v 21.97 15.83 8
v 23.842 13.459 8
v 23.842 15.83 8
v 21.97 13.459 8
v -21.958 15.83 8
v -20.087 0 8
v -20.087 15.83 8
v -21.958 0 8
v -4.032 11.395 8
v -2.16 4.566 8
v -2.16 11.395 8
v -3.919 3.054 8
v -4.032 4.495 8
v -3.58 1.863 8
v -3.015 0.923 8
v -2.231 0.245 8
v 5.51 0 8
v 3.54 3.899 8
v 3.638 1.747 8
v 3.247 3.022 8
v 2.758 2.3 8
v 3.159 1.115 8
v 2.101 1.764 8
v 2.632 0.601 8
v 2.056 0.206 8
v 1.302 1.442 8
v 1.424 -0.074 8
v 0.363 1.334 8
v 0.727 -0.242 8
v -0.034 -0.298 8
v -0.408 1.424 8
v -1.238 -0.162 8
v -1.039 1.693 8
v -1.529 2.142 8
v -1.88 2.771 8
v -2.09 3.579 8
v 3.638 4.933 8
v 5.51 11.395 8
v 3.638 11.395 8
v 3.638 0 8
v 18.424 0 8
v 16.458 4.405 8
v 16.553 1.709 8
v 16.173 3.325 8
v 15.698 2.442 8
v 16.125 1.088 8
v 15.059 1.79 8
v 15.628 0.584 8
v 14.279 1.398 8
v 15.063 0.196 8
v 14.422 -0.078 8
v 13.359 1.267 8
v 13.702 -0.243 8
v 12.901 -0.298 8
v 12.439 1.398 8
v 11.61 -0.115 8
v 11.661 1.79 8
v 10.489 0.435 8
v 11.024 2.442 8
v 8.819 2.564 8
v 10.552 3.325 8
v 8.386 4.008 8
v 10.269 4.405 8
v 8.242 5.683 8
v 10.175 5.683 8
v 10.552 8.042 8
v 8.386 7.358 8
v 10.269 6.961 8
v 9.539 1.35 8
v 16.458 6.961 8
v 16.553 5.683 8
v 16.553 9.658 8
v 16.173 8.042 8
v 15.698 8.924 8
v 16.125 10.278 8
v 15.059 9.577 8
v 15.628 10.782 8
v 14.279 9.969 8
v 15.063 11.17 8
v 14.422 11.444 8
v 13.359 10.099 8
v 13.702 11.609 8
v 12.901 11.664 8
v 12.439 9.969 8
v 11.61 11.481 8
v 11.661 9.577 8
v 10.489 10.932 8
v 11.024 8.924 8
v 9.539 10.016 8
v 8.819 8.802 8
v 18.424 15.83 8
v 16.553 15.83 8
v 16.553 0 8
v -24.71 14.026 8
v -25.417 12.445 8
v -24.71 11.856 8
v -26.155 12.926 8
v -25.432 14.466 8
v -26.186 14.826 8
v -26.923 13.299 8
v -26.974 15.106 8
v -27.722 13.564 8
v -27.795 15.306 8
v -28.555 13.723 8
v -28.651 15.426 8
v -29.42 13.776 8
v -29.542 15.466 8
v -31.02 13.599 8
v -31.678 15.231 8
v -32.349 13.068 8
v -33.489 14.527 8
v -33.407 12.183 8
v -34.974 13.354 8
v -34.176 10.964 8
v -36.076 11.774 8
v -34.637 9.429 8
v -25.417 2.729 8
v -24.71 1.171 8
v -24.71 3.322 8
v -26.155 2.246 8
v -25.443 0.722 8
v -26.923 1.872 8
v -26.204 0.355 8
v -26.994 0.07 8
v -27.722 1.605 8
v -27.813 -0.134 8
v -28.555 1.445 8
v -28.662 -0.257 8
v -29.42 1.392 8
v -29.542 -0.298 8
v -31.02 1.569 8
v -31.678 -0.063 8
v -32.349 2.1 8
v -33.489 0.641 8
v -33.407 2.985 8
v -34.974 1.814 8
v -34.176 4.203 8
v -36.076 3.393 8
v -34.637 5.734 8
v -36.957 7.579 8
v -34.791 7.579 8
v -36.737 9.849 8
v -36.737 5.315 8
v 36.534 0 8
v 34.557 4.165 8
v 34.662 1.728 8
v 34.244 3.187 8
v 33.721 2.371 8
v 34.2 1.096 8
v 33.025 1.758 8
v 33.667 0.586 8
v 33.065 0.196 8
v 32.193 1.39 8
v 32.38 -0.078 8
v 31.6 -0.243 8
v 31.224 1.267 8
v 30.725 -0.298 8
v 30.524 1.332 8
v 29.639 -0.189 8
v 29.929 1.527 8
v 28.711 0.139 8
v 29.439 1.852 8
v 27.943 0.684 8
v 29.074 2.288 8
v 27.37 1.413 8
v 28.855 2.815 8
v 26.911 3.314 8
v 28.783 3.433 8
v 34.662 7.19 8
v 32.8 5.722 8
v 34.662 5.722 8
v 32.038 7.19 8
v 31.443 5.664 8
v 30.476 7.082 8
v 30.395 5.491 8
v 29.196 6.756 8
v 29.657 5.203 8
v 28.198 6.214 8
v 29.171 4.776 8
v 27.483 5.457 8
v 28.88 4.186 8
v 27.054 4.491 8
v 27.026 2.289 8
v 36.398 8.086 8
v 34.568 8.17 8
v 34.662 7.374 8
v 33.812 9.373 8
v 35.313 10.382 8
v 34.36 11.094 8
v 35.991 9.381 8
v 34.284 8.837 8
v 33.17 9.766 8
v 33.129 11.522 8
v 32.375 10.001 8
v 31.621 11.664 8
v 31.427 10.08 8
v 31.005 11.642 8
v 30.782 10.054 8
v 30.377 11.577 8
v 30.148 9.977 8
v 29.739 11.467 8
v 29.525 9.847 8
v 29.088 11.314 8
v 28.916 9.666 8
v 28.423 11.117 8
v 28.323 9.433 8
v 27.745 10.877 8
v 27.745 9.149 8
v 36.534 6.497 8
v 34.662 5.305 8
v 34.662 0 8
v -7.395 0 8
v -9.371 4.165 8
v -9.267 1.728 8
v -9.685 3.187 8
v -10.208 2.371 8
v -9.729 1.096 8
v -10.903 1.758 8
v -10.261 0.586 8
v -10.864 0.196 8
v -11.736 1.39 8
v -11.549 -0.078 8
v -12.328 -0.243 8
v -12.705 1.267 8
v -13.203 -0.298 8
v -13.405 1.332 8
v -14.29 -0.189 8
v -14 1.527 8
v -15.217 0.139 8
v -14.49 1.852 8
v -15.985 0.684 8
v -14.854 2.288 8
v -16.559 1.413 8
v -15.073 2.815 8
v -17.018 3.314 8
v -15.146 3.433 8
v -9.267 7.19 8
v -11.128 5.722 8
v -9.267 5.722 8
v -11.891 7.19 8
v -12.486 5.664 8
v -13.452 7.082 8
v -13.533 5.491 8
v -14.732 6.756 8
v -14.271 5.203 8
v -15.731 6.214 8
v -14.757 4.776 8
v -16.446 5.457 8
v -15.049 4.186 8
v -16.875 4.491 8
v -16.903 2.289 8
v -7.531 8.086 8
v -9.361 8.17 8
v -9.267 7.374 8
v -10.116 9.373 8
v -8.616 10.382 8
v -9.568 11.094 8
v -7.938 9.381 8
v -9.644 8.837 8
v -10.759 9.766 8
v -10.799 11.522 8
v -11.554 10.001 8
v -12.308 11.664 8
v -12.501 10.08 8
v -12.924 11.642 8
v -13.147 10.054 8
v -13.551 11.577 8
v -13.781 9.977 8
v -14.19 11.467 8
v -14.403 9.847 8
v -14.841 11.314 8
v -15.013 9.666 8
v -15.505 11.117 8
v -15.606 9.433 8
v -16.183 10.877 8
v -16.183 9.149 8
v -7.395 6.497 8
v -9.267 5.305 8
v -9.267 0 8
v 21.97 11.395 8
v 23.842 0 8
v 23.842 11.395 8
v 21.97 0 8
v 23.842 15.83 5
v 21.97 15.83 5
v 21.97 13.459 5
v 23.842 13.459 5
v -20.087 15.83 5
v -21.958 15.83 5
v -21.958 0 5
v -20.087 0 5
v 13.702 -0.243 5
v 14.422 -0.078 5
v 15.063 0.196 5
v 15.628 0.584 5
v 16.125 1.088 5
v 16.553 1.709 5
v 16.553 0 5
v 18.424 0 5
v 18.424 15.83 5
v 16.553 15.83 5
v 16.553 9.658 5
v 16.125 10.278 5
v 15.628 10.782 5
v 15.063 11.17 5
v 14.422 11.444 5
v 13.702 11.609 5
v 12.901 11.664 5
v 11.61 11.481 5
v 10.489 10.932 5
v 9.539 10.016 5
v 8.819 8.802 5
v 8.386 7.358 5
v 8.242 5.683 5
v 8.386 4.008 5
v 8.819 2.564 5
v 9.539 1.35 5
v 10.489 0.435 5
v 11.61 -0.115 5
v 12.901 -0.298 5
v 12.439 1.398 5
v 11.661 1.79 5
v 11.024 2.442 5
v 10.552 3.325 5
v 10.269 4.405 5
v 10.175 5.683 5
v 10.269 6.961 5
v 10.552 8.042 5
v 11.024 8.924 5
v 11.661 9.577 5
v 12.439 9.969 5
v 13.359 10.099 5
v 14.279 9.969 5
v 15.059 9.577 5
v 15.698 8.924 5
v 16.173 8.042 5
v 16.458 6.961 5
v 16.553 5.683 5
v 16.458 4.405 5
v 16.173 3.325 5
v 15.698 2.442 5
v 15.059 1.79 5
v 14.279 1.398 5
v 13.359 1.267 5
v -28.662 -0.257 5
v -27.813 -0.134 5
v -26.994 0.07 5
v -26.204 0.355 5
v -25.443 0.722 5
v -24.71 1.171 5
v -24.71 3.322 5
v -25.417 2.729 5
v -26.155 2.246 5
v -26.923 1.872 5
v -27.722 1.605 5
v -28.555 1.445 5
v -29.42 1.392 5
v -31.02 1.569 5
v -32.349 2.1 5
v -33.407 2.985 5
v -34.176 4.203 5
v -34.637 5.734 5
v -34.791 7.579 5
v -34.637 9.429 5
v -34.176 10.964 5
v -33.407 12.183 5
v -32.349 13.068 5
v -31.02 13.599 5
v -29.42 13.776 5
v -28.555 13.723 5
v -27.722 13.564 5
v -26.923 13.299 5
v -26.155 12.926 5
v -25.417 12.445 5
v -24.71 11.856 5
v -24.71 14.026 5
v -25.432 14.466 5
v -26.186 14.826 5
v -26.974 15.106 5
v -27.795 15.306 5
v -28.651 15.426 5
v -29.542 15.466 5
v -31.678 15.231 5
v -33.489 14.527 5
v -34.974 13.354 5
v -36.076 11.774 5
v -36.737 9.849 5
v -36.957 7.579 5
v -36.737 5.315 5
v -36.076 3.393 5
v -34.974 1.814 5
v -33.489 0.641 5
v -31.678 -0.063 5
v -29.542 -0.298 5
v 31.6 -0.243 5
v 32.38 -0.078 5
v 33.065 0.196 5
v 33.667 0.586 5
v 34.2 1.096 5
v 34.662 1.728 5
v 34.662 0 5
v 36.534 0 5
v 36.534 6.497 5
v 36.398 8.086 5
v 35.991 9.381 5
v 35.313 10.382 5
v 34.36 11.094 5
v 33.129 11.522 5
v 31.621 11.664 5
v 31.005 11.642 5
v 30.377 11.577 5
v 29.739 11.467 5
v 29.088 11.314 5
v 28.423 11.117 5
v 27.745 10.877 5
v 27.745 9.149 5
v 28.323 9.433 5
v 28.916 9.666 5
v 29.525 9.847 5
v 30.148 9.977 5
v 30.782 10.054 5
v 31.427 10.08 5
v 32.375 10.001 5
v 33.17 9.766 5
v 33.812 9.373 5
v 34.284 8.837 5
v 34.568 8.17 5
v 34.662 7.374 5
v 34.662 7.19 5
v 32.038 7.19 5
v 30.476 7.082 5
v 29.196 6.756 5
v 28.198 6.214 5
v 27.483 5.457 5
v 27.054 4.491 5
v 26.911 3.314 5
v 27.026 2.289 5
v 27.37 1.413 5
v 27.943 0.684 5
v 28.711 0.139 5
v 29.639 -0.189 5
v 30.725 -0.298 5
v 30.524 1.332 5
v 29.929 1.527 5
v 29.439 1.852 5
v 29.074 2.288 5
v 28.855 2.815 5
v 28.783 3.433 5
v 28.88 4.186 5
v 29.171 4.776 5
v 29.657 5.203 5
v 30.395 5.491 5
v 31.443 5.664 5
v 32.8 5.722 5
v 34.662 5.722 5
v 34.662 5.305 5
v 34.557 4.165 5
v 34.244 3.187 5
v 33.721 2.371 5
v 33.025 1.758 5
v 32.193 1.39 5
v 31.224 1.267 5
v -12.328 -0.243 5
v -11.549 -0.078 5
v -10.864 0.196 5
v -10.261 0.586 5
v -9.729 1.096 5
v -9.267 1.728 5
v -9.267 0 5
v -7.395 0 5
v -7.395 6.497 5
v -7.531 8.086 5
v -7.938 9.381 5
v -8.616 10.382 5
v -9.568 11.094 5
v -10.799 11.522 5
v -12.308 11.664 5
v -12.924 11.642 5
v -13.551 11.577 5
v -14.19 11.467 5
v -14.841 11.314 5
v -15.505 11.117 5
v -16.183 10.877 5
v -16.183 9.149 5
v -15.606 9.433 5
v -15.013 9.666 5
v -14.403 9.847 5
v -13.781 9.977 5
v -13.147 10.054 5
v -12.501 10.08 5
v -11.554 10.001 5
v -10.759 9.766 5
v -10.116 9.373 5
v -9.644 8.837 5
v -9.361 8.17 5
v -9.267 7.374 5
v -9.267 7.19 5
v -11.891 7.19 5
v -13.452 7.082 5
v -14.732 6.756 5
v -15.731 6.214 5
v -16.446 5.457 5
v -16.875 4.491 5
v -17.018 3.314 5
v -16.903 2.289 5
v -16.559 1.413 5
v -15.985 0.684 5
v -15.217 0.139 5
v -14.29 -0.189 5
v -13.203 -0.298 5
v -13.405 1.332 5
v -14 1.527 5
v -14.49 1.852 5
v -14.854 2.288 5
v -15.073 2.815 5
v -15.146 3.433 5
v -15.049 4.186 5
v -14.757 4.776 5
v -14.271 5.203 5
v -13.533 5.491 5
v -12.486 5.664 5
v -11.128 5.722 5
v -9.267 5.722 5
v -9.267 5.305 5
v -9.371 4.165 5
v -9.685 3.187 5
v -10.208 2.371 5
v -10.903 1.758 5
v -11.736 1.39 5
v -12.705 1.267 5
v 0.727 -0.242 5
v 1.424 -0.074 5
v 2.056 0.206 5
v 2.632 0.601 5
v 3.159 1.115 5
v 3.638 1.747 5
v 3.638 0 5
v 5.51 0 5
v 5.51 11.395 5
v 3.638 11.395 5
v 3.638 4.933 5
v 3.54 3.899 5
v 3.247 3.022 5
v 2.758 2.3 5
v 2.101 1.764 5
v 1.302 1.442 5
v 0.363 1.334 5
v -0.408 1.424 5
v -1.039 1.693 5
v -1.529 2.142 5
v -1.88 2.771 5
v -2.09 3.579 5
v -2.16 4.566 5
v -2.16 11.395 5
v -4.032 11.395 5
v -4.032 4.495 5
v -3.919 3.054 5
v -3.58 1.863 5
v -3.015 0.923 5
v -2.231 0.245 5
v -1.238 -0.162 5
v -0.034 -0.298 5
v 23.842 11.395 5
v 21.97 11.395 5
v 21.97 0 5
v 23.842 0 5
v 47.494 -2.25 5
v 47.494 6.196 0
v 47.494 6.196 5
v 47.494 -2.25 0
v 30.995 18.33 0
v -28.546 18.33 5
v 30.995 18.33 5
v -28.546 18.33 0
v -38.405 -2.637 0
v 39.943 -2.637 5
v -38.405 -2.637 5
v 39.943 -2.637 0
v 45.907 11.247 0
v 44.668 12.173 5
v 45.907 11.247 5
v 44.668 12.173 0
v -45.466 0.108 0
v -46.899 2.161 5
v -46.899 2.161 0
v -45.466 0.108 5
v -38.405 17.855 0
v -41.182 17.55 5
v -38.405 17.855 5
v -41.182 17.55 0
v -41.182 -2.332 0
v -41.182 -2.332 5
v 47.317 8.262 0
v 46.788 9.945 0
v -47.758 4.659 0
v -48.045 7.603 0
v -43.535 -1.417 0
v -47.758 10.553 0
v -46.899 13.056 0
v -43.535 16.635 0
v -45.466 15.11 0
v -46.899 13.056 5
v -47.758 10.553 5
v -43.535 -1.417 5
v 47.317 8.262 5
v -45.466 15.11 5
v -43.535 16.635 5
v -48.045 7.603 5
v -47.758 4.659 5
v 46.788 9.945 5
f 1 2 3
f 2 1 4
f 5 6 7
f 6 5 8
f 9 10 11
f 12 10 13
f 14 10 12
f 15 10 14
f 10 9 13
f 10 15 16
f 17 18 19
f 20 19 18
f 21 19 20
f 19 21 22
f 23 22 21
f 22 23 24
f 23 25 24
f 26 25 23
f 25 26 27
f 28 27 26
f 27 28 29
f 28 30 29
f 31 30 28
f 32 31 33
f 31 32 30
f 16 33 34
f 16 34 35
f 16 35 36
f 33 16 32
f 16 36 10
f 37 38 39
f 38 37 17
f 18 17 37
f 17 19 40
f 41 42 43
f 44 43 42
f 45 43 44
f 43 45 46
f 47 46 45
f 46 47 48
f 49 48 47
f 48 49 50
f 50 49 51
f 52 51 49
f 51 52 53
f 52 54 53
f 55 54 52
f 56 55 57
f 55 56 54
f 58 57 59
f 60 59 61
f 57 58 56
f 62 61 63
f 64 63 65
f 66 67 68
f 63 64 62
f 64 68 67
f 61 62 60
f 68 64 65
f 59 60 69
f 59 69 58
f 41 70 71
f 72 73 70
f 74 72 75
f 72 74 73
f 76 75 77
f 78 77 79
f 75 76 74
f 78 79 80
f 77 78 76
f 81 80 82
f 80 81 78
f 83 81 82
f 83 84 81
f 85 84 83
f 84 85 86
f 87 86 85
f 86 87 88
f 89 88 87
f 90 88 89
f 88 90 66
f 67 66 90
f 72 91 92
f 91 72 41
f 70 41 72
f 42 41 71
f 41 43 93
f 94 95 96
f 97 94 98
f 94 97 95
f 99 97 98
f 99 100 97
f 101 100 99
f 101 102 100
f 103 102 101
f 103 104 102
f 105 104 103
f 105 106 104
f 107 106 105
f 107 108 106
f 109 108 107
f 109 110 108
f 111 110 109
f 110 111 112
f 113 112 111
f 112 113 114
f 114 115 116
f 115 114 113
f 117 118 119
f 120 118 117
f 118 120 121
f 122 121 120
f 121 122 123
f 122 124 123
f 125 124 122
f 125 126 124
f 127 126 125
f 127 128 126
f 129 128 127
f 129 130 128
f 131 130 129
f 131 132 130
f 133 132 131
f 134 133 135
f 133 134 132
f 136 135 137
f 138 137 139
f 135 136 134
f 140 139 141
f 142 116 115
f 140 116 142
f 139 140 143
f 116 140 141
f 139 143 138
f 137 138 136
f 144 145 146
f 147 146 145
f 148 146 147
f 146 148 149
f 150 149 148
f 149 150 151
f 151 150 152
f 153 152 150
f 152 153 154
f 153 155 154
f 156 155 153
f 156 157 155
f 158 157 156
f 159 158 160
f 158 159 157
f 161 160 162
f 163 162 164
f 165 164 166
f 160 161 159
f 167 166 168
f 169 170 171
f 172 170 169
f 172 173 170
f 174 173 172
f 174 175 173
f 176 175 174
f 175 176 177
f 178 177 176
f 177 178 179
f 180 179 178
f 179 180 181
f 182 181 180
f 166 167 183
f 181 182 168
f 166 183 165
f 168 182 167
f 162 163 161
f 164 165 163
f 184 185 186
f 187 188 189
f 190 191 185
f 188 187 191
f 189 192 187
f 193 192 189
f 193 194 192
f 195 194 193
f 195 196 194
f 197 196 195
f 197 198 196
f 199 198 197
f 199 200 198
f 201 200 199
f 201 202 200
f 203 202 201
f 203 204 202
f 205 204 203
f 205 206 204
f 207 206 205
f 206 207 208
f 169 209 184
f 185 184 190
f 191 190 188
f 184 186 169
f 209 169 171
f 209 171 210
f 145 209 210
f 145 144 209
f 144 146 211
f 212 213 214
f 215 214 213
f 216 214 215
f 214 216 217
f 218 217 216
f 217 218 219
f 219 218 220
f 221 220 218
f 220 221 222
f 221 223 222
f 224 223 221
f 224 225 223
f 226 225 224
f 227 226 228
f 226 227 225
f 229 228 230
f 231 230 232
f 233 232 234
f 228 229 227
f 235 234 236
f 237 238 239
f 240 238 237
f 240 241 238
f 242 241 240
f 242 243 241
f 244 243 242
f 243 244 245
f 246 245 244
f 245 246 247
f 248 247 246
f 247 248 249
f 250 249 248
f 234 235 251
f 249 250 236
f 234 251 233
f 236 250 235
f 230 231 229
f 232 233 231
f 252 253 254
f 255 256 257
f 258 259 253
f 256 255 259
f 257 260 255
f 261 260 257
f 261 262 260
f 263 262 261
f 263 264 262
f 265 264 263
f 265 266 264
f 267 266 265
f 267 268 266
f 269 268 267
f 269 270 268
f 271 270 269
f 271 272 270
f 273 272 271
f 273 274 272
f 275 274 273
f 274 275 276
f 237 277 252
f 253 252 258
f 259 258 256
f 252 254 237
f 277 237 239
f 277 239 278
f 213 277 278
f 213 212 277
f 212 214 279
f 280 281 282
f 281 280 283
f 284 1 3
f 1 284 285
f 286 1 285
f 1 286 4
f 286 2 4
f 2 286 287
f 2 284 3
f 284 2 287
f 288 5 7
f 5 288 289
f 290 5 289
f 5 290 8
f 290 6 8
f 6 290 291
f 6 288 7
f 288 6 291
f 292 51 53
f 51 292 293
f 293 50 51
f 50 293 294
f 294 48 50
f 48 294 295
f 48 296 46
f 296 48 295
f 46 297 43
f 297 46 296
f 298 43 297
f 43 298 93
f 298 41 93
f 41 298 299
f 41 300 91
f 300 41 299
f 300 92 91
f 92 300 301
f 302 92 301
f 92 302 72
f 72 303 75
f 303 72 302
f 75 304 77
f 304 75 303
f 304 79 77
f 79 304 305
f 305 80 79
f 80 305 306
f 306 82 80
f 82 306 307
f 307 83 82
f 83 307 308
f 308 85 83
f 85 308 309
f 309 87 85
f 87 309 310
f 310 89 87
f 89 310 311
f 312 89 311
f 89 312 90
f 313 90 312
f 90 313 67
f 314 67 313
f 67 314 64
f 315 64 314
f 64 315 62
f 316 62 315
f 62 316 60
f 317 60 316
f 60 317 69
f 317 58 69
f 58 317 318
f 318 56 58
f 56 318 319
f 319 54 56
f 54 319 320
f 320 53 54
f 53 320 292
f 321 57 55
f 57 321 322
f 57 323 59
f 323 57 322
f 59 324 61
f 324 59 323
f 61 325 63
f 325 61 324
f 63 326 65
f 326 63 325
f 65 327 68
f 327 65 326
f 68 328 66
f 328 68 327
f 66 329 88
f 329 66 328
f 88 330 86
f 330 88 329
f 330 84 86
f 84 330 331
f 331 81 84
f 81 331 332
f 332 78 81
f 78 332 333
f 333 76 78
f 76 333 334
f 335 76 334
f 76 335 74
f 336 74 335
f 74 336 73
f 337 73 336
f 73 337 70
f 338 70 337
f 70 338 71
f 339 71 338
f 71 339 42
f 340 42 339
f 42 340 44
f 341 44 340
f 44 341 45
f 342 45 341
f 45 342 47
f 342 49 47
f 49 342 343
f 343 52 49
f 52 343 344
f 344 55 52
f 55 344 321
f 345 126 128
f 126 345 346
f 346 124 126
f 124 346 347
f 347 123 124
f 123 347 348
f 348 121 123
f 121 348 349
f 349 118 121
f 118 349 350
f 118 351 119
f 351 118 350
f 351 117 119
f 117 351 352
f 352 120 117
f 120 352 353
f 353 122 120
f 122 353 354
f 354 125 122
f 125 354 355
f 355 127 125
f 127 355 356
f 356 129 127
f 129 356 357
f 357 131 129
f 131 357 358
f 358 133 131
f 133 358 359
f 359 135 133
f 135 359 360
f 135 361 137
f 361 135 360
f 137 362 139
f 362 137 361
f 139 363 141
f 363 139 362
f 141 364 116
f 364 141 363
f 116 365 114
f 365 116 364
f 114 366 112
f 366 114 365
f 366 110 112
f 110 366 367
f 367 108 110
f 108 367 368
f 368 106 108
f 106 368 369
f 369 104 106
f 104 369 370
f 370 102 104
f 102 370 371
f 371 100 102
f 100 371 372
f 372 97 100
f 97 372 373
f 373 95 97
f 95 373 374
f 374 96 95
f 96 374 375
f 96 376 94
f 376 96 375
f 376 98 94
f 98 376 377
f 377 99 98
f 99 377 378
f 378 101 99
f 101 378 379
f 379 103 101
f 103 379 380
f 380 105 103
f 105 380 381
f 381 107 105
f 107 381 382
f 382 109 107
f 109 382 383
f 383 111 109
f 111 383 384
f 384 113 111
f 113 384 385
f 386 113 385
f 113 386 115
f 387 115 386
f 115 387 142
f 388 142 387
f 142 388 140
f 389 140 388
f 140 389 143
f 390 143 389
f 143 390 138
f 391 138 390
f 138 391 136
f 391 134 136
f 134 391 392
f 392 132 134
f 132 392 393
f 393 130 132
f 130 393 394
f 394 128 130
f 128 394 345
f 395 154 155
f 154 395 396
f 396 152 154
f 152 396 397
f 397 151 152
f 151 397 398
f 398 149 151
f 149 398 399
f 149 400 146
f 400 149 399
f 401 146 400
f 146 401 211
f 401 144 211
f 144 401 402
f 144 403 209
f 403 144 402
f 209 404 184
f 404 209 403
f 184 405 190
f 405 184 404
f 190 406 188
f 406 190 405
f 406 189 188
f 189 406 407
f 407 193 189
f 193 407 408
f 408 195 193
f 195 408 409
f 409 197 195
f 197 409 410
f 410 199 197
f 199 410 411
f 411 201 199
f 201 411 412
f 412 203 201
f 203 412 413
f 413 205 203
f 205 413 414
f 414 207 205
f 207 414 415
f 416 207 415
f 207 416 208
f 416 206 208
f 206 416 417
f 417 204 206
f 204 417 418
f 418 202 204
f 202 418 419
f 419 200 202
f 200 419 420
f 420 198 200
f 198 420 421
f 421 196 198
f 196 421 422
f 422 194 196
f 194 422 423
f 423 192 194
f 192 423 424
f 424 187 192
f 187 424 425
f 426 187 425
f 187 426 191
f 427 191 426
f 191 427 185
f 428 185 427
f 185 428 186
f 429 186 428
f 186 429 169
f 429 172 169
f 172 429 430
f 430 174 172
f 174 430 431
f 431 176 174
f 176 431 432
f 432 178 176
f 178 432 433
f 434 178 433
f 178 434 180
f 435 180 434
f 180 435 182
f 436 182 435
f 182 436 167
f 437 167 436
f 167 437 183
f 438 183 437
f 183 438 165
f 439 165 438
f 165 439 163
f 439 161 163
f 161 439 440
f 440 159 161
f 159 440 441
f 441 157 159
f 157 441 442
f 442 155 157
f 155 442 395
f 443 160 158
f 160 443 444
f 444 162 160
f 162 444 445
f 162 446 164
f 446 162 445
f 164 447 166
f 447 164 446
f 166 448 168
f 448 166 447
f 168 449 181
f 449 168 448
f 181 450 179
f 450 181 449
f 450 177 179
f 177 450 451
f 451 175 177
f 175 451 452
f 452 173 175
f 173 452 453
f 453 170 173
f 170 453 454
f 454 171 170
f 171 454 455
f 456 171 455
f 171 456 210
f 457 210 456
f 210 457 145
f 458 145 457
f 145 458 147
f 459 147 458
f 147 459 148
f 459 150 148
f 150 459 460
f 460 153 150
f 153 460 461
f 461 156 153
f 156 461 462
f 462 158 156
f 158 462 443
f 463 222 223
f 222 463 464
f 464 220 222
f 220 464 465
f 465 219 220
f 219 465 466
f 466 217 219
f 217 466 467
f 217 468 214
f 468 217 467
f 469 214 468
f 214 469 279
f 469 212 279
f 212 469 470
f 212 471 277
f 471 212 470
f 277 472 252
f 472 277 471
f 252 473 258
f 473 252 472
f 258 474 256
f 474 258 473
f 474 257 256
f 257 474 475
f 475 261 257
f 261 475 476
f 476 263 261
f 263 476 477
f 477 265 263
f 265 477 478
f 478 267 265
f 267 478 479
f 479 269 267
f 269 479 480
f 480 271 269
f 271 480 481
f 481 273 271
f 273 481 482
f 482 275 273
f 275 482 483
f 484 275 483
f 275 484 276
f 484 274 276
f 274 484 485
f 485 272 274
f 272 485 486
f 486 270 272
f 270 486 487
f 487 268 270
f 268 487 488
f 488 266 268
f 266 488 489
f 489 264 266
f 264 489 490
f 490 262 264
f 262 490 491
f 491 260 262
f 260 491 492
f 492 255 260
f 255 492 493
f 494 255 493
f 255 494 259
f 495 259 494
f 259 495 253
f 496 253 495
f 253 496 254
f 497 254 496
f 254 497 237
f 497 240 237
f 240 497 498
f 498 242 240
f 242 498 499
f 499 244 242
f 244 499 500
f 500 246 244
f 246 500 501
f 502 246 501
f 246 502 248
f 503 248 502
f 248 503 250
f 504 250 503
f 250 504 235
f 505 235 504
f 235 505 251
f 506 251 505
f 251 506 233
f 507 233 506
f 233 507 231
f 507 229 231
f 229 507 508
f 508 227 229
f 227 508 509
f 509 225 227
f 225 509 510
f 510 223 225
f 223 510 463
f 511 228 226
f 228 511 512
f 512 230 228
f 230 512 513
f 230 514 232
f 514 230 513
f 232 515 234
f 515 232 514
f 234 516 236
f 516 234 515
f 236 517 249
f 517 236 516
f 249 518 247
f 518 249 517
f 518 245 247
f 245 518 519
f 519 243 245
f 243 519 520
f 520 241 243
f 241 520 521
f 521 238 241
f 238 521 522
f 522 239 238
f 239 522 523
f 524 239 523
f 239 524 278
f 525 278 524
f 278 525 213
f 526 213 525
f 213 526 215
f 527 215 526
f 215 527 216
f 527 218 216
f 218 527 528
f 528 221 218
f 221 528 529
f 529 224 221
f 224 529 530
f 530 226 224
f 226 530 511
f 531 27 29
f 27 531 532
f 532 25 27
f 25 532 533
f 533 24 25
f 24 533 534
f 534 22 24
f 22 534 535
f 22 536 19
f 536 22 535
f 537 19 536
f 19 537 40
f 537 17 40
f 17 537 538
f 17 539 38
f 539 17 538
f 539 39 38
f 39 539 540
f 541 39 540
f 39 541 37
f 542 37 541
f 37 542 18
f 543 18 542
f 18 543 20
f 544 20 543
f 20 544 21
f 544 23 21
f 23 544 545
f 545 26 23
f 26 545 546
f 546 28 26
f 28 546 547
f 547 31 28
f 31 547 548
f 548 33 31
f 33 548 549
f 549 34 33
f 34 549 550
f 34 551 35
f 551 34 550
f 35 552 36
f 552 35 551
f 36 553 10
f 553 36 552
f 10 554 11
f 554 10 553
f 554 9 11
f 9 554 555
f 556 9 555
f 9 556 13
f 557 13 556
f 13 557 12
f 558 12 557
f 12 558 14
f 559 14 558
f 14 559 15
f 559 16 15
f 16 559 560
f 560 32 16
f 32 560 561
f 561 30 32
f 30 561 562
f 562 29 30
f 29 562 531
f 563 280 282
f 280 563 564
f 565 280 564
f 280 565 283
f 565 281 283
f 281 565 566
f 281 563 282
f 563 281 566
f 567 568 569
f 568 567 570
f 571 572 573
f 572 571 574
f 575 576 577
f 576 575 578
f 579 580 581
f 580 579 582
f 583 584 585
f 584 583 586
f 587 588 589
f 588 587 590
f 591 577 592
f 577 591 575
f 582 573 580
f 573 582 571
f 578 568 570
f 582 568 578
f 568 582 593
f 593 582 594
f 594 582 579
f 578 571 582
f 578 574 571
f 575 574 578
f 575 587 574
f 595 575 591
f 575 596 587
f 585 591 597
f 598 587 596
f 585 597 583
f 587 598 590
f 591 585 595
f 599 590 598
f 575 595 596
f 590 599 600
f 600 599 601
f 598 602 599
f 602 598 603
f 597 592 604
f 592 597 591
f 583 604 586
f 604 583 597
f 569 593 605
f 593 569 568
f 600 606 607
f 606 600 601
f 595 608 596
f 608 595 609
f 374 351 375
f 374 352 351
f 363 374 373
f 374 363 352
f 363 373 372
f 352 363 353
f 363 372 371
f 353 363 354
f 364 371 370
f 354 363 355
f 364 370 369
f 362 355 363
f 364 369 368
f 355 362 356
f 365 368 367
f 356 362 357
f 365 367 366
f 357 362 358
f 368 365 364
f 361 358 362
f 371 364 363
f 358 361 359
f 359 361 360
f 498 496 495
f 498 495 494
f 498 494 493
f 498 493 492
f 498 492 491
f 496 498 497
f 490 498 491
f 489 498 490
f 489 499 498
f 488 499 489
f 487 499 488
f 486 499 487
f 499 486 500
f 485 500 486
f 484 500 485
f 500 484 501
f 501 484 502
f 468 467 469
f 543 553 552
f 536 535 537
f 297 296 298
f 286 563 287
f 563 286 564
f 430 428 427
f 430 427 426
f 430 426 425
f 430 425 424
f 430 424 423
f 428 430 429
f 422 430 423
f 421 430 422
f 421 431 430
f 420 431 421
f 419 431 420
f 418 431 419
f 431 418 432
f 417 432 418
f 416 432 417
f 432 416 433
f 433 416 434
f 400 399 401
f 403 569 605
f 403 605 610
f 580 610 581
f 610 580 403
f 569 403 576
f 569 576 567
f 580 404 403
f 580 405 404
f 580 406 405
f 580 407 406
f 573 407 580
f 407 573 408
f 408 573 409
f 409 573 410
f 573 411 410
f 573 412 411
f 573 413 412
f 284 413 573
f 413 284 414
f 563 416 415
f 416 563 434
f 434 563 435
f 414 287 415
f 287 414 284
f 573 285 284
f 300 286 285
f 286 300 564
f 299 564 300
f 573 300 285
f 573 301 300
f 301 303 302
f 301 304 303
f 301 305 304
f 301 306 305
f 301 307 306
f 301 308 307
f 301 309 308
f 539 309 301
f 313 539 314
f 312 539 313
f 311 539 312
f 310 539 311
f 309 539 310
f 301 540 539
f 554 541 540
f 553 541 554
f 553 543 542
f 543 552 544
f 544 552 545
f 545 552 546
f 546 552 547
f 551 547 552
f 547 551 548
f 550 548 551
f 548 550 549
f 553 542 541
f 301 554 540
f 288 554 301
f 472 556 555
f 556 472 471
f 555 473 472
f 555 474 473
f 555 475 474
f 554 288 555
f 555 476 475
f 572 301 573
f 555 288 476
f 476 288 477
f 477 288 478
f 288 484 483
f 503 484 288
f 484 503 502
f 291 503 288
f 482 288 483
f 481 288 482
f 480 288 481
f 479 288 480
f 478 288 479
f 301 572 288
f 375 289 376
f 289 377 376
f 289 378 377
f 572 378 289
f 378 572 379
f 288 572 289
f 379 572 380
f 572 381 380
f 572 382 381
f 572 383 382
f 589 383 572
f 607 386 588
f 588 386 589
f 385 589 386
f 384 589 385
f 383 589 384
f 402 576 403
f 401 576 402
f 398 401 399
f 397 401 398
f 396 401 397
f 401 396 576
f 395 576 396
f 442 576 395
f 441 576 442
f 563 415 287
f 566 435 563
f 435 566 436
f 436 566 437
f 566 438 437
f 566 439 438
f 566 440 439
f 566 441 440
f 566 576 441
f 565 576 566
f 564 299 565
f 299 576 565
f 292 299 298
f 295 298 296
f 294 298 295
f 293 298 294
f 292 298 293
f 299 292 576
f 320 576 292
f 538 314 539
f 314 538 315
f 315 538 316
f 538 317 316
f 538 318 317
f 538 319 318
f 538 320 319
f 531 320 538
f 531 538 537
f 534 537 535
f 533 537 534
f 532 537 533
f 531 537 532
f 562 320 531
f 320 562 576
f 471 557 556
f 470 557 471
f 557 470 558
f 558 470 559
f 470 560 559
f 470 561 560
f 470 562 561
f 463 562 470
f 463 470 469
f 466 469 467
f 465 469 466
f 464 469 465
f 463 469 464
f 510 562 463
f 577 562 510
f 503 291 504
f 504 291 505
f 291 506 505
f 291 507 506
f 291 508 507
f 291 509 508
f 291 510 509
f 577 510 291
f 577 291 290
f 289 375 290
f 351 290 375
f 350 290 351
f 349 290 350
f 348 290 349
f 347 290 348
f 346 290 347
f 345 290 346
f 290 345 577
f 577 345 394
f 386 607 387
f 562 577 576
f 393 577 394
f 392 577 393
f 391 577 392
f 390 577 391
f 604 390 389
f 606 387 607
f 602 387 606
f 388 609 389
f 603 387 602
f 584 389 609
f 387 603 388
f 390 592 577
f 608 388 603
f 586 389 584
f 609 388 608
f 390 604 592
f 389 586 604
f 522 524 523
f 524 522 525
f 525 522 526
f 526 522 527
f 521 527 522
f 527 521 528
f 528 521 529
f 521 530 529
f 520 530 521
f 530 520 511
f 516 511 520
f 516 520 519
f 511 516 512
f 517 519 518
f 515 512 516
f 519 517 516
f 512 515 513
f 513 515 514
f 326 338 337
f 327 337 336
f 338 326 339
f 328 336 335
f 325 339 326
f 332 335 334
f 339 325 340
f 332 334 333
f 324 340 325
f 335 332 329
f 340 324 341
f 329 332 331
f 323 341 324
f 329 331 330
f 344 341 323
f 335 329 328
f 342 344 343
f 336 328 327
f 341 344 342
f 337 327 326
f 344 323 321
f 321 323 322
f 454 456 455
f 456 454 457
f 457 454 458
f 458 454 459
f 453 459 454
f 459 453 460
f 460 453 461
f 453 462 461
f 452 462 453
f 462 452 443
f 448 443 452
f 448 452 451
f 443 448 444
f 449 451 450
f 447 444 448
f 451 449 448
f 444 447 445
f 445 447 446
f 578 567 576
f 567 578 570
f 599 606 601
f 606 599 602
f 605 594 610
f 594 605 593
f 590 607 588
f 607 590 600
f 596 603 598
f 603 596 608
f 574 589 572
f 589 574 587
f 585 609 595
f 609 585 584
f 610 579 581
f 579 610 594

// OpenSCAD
nombre="Claudia";

module iman(texto = nombre ,fuente = "Ubuntu",tam = 15){
    translate([0,0,3])
    linear_extrude(height=5)
    text(texto, size =tam,halign="center",font=fuente, $fn=20); 
    translate([0,-tam*0.15,0])
    hull(){
        linear_extrude(height=5)
        text(texto, size =tam*1.3,halign="center",font=fuente, $fn=20);
    }
    
}

//iman(texto = "Fausti" ,fuente = "Century Schoolbook L",tam = 27);
iman();
